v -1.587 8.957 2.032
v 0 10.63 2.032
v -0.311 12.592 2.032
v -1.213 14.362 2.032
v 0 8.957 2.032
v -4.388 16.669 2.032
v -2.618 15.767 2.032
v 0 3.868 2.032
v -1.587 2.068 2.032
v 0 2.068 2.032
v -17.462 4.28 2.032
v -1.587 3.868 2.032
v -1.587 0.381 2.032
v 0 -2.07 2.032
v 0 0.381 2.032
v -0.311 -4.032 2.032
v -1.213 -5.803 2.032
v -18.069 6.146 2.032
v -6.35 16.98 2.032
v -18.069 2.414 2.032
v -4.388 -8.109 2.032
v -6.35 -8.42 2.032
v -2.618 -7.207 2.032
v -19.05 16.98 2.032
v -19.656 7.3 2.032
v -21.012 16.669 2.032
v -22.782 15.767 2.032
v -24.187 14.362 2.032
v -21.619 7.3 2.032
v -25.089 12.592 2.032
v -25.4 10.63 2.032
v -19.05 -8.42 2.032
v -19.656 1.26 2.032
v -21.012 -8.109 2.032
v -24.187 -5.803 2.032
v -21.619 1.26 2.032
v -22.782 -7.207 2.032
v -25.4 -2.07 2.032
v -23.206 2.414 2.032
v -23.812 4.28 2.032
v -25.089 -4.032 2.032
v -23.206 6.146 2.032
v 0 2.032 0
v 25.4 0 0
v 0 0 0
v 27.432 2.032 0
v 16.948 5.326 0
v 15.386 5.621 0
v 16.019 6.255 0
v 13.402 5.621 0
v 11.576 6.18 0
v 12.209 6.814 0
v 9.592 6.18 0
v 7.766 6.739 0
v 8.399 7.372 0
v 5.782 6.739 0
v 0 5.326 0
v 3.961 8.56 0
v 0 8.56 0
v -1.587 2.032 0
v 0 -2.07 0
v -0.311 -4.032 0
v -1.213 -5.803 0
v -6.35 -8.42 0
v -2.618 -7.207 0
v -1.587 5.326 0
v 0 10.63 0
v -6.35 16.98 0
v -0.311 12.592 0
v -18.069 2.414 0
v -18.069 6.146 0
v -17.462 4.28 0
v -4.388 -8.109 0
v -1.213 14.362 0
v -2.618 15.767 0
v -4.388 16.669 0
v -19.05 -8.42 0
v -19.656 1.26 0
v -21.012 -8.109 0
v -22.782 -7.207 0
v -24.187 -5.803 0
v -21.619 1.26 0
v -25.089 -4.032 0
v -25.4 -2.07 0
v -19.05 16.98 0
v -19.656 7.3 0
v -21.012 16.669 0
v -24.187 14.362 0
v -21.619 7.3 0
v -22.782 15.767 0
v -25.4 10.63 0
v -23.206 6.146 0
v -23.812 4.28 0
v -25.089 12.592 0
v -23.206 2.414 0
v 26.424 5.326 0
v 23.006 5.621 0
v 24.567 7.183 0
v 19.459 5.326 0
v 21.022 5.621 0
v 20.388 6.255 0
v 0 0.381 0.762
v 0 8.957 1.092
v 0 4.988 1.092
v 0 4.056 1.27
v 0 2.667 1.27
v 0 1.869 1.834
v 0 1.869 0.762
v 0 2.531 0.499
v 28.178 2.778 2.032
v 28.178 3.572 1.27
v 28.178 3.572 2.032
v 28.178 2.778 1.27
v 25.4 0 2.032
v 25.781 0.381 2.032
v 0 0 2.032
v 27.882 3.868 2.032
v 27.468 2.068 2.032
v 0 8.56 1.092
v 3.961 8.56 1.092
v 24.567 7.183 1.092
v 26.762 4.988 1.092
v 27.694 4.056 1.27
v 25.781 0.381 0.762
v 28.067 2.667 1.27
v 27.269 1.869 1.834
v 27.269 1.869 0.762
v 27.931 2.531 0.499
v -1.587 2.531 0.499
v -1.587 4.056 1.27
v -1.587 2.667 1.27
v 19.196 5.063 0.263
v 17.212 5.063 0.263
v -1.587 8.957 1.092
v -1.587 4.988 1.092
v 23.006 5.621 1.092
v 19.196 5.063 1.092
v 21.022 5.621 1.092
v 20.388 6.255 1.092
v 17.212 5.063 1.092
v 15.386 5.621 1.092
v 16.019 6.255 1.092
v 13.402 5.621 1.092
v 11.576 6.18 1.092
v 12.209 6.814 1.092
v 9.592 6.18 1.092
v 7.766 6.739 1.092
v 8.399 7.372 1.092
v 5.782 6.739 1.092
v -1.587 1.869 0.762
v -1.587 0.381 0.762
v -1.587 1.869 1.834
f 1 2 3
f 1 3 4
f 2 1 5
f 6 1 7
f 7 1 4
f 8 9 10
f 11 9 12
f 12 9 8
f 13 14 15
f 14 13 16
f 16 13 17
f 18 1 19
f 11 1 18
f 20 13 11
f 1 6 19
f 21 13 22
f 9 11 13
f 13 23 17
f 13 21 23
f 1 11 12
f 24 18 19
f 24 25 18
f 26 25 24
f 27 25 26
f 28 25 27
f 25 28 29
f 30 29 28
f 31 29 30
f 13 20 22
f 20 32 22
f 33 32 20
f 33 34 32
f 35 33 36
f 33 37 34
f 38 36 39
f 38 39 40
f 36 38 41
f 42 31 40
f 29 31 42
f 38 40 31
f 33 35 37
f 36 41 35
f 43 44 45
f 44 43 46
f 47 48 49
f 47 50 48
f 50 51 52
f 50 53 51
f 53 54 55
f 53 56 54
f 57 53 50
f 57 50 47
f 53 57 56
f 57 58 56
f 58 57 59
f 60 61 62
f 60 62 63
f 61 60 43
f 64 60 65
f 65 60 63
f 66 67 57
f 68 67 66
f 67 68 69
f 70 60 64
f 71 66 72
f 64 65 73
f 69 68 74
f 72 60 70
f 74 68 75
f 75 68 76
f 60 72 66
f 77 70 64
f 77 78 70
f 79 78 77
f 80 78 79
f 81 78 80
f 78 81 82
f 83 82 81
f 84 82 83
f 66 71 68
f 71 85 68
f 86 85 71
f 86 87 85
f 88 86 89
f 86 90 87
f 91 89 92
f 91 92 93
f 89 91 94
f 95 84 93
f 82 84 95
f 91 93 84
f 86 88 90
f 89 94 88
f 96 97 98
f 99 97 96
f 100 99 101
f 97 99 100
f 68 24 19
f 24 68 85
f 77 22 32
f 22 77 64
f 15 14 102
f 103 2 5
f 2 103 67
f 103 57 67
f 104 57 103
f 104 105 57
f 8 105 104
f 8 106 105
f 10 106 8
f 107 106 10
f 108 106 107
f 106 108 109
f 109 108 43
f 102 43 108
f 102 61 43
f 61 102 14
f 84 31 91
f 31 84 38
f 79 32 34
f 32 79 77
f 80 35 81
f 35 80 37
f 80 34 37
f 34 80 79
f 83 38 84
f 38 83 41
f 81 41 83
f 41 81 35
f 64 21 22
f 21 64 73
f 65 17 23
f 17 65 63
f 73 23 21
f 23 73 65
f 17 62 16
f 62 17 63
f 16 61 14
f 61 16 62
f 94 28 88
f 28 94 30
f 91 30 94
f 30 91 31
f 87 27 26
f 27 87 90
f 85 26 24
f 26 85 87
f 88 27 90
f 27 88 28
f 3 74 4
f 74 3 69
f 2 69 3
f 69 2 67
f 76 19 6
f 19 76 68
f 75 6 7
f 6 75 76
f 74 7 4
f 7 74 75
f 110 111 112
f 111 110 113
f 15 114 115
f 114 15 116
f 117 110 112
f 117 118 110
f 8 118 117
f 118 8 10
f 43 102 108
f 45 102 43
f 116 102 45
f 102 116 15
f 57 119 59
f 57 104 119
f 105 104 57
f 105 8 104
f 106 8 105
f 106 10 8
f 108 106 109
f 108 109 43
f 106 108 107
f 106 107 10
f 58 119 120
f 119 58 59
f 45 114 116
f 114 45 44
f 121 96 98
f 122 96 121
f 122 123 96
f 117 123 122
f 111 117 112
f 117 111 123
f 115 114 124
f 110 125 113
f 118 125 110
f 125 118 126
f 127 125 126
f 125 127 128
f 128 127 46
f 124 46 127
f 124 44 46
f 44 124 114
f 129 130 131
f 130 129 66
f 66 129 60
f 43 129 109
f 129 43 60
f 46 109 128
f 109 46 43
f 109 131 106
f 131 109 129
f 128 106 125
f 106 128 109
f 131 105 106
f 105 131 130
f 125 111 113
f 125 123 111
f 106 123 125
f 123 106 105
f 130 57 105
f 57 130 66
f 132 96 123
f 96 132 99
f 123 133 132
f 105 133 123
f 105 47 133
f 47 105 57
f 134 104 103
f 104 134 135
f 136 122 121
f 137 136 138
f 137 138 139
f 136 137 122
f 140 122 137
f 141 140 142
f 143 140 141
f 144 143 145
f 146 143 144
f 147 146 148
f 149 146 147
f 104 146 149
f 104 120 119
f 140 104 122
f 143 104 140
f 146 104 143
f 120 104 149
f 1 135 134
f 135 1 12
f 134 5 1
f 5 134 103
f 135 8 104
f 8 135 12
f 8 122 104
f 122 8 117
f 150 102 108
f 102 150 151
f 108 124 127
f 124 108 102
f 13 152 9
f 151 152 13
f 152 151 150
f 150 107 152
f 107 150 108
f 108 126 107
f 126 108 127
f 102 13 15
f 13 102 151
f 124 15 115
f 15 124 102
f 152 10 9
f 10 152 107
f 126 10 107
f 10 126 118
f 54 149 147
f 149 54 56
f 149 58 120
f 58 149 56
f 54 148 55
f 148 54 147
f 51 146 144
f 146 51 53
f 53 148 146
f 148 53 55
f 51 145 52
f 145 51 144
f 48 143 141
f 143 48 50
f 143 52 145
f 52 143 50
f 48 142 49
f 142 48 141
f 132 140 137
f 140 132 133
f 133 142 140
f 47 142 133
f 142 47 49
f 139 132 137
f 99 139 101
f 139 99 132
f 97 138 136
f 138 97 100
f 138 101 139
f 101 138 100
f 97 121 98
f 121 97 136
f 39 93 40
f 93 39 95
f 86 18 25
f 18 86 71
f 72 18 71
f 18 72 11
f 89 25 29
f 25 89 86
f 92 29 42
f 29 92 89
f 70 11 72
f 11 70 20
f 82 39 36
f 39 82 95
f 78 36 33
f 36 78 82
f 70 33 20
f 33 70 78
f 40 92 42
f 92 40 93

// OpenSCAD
// Physical Keygen - by Nirav Patel <http://eclecti.cc>
//
// Generate a duplicate of a Kwikset KW1 key by editing the last line of the file
// and entering in the key code of the lock.  If you don't know the key code,
// you can measure the key and compare the numbers at:
// http://web.archive.org/web/20050217020917fw_/http://dlaco.com/spacing/tips.htm
//
// This work is licensed under a Creative Commons Attribution 3.0 Unported License.

// Since the keys and locks I have were all designed in imperial units, the
// constants in this file will be defined in inches.  The mm function
// allows us to retain the proper size for exporting a metric STL.
function mm(i) = i*25.4;

module rounded(size, r) {
    union() {
        translate([r, 0, 0]) cube([size[0]-2*r, size[1], size[2]]);
        translate([0, r, 0]) cube([size[0], size[1]-2*r, size[2]]);
        translate([r, r, 0]) cylinder(h=size[2], r=r);
        translate([size[0]-r, r, 0]) cylinder(h=size[2], r=r);
        translate([r, size[1]-r, 0]) cylinder(h=size[2], r=r);
        translate([size[0]-r, size[1]-r, 0]) cylinder(h=size[2], r=r);
    }
}

module bit() {
    w = mm(1/4);
    difference() {
        translate([-w/2, 0, 0]) cube([w, mm(1), w]);
        translate([-mm(5/128), 0, 0]) rotate([0, 0, 135]) cube([w, w, w]);
        translate([mm(5/128), 0, 0]) rotate([0, 0, -45]) cube([w, w, w]);
    }
}

// Kwikset KW1 5 pin key.  The measurements are mostly guesses based on reverse
// engineering some keys I have and some publicly available information.
module kw1(bits) {
    // You may need to adjust these to fit your specific printer settings
    thickness = mm(0.080);
    length = mm(9/8);
    width = mm(.337);
    
    shoulder = mm(.247);
    pin_spacing = mm(.15);
    depth_inc = mm(.022);
    
    // A fudge factor.  Printing with your average RepRap, the bottom layer is
    // going to be squeezed larger than you want. You can make the pins
    // go slighly deeper by a fudge amount to make up for it if you aren't
    // adjusting for it elsewhere like Skeinforge or in your firmware.
    fudge = 0.5;
    
    // Handle size
    h_l = mm(1);
    h_w = mm(1);
    h_d = mm(1/16);
    difference() {
        // blade and key handle
        union() {
            translate([-h_l, -h_w/2 + width/2, 0]) rounded([h_l, h_w, thickness], mm(1/4));
            // cut a little off the tip to avoid going too long
            cube([length - mm(1/64), width, thickness]);
        }
        
        // chamfer the tip
        translate([length, mm(1/8), 0]) {
            rotate([0, 0, 45]) cube([10, 10, thickness]);
            rotate([0, 0, 225]) cube([10, 10, thickness]);
        }
        
        // put in a hole for keychain use
        translate([-h_l + mm(3/16), width/2, 0]) cylinder(h=thickness, r=mm(1/8));
        
        // cut the channels in the key.  designed more for printability than accuracy
        union() {
            translate([-h_d, mm(.105), mm(.025)]) rotate([225, 0, 0]) cube([length + h_d, width, width]);
            translate([-h_d, mm(.105), mm(.05)]) rotate([260, 0, 0]) cube([length + h_d, thickness/2, mm(1/32)]);
            translate([-h_d, mm(.105), 0]) cube([length + h_d, mm(7/128), mm(.05)]);
            translate([-h_d, mm(.105) + mm(7/128), mm(.05)]) rotate([225, 0, 0]) cube([length + h_d, mm(3/64), thickness]);
        }
        
        translate([-h_d, width - mm(9/64), mm(.043)]) {
            cube([length + h_d, width - (width - mm(10/64)), thickness]);
            rotate([50, 0, 0]) cube([length + h_d, width, thickness]);
        }
        
        union() {
            translate([-h_d, mm(0.015), mm(.03)]) cube([length + h_d, mm(15/256), thickness]);
            translate([-h_d, mm(0.015) + mm(13/256), thickness - mm(1/64)]) rotate([45, 0, 0]) cube([length + h_d, mm(1/16), mm(1/16)]);
        }
        
        // Do the actual bitting
        for (b = [0:4]) {
            // KW1 doesn't have a 0 value and instead has 1 start around .008" deep
            translate([shoulder + fudge + b*pin_spacing, width - mm(.008) - (bits[b] - 1)*depth_inc - fudge, 0]) bit();
        }
    }
}

// This sample key goes to a lock that is sitting disassembled on my desk
// Flip the key over for easy printing
kw1([3,4,5,6,5]);
